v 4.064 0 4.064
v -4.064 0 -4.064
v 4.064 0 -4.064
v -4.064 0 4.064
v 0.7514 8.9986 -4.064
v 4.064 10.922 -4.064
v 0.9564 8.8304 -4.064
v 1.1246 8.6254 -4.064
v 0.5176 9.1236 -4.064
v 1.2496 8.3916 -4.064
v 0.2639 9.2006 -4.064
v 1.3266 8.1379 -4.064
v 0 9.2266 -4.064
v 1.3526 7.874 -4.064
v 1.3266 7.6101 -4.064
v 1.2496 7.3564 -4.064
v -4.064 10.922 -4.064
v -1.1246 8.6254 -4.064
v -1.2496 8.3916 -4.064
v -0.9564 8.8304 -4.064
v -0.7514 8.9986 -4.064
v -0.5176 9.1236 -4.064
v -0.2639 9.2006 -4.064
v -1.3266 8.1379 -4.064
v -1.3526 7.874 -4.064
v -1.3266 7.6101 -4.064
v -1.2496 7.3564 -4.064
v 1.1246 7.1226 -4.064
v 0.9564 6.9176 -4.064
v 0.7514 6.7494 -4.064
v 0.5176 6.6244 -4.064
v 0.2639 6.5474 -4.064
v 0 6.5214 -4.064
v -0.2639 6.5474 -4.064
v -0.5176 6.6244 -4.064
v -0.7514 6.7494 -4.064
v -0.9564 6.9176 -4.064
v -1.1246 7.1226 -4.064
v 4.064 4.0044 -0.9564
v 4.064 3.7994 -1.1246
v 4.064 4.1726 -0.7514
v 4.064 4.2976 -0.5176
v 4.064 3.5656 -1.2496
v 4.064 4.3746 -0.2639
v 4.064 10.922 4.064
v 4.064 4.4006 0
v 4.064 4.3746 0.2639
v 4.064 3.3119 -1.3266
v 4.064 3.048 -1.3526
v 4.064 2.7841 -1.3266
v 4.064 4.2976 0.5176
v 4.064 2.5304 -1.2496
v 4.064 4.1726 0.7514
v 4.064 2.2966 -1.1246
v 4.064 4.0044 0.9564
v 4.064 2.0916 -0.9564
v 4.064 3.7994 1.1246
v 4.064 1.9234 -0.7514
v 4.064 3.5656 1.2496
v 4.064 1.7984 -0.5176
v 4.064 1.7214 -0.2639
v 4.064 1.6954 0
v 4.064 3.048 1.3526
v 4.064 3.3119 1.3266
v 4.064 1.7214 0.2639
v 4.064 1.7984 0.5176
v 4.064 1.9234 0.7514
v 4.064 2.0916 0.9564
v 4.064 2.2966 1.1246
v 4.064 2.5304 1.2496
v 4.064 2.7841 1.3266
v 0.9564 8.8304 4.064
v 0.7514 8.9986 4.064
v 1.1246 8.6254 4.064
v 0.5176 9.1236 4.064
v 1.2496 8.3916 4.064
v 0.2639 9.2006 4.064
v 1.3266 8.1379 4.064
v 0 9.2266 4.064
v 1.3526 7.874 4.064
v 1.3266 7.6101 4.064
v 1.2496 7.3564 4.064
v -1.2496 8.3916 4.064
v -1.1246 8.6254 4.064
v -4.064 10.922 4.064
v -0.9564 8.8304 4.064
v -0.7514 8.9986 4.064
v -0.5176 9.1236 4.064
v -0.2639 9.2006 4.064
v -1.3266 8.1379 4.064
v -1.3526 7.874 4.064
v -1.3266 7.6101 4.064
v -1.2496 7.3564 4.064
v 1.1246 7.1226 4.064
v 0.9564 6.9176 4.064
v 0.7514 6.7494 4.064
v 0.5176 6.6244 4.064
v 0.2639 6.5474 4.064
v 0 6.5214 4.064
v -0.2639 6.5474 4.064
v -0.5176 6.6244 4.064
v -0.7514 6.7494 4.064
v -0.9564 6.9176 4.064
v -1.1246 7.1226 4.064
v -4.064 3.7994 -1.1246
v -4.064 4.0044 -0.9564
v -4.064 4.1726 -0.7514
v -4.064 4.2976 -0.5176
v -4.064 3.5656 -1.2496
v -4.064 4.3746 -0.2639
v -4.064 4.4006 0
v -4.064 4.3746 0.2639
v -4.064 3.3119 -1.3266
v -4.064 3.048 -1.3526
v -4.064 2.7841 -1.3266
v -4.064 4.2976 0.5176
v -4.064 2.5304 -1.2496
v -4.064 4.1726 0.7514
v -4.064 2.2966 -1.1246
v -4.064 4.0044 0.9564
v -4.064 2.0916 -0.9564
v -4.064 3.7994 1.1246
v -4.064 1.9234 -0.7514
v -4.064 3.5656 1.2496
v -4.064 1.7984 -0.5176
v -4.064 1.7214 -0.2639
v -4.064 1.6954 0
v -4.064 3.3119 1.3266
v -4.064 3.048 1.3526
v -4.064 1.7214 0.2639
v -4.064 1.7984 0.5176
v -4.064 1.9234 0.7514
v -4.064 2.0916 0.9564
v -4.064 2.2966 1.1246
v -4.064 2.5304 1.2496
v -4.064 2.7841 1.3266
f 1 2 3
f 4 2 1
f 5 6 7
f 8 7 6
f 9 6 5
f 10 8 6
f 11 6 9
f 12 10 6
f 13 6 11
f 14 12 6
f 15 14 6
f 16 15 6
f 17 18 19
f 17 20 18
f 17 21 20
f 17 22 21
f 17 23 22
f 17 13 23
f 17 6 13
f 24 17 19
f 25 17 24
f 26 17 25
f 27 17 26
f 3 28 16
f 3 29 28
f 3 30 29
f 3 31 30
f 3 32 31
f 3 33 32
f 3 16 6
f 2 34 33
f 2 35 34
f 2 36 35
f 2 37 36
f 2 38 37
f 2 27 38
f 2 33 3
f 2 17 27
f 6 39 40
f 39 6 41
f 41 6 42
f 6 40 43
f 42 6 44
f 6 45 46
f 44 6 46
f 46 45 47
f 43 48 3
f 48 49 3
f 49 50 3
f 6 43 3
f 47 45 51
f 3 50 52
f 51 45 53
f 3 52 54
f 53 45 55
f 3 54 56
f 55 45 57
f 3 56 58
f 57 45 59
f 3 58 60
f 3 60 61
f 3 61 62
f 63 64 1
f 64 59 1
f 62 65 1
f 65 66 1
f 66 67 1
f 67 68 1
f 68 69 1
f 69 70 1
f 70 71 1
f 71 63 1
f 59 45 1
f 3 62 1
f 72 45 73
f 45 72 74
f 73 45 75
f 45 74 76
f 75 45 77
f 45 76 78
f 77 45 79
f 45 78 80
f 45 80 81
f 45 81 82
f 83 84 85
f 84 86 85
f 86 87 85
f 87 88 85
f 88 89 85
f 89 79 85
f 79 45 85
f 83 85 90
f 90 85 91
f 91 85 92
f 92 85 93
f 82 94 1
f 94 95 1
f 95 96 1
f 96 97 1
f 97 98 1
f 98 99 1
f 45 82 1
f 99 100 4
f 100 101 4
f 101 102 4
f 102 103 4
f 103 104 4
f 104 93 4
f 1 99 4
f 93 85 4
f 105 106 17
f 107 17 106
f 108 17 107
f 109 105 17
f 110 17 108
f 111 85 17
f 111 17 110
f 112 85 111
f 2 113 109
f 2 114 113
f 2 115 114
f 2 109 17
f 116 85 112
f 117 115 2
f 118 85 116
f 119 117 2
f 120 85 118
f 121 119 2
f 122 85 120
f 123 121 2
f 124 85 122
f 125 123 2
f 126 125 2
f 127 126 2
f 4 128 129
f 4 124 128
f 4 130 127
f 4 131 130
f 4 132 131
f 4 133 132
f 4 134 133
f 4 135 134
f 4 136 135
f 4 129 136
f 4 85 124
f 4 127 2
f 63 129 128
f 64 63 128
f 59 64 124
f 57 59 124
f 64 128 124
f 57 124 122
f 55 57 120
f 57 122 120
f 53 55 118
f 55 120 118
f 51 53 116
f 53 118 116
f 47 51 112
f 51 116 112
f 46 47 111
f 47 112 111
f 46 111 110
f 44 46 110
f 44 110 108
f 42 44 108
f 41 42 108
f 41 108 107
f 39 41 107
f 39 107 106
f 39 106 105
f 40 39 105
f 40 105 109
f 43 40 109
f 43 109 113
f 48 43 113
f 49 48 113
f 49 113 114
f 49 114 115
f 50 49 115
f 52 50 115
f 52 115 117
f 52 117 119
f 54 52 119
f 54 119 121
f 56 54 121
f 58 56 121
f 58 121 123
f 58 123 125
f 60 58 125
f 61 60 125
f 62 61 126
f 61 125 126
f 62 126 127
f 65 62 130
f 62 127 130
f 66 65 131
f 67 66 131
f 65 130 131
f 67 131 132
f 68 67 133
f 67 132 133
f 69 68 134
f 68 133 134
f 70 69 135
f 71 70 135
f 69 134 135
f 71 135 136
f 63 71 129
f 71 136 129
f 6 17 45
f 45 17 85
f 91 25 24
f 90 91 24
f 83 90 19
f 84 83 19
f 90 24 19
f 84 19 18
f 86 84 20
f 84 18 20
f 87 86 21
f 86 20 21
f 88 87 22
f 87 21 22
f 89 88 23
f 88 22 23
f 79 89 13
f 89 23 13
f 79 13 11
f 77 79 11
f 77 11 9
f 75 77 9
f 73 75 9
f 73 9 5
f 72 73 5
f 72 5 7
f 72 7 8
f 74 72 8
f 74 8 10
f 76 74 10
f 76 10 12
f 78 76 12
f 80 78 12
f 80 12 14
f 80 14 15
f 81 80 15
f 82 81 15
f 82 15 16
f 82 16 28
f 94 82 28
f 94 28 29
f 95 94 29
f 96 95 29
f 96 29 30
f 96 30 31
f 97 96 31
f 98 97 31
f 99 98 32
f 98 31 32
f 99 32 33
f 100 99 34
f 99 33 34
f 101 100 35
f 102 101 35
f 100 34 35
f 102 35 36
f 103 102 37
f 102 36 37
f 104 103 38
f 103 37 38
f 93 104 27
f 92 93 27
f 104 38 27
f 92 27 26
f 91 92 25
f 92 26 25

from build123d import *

# Parameters (mm, degrees)
SKETCH1_W                  = 10.922
SKETCH1_H                  = 8.128
BOSS_EXTRUDE1_DEPTH        = 8.128
M2_5_CLEARANCE_HOLE1_D     = 2.7051
M2_5_CLEARANCE_HOLE1_DEPTH = 8.128
M2_5_CLEARANCE_HOLE2_D     = 2.7051
M2_5_CLEARANCE_HOLE2_DEPTH = 8.128


with BuildPart() as part:
    # Sketch1 → Boss-Extrude1 (new body)
    with BuildSketch(Plane(origin=(-4.064, 0, 0), x_dir=(0, -1, 0), z_dir=(-1, 0, 0))):
        with Locations((-5.461, 0)):
            Rectangle(SKETCH1_W, SKETCH1_H)
    extrude(amount=-BOSS_EXTRUDE1_DEPTH)

    # M2.5 Clearance Hole1
    with Locations(Plane(origin=(4.064, 0, 0), x_dir=(0, 0, -1), z_dir=(1, 0, 0))):
        with Locations((0, 3.048)):
            Hole(M2_5_CLEARANCE_HOLE1_D / 2, depth=M2_5_CLEARANCE_HOLE1_DEPTH)

    # M2.5 Clearance Hole2
    with Locations(Plane.XY.offset(4.064)):
        with Locations((0, 7.874)):
            Hole(M2_5_CLEARANCE_HOLE2_D / 2, depth=M2_5_CLEARANCE_HOLE2_DEPTH)


solid = part.part
